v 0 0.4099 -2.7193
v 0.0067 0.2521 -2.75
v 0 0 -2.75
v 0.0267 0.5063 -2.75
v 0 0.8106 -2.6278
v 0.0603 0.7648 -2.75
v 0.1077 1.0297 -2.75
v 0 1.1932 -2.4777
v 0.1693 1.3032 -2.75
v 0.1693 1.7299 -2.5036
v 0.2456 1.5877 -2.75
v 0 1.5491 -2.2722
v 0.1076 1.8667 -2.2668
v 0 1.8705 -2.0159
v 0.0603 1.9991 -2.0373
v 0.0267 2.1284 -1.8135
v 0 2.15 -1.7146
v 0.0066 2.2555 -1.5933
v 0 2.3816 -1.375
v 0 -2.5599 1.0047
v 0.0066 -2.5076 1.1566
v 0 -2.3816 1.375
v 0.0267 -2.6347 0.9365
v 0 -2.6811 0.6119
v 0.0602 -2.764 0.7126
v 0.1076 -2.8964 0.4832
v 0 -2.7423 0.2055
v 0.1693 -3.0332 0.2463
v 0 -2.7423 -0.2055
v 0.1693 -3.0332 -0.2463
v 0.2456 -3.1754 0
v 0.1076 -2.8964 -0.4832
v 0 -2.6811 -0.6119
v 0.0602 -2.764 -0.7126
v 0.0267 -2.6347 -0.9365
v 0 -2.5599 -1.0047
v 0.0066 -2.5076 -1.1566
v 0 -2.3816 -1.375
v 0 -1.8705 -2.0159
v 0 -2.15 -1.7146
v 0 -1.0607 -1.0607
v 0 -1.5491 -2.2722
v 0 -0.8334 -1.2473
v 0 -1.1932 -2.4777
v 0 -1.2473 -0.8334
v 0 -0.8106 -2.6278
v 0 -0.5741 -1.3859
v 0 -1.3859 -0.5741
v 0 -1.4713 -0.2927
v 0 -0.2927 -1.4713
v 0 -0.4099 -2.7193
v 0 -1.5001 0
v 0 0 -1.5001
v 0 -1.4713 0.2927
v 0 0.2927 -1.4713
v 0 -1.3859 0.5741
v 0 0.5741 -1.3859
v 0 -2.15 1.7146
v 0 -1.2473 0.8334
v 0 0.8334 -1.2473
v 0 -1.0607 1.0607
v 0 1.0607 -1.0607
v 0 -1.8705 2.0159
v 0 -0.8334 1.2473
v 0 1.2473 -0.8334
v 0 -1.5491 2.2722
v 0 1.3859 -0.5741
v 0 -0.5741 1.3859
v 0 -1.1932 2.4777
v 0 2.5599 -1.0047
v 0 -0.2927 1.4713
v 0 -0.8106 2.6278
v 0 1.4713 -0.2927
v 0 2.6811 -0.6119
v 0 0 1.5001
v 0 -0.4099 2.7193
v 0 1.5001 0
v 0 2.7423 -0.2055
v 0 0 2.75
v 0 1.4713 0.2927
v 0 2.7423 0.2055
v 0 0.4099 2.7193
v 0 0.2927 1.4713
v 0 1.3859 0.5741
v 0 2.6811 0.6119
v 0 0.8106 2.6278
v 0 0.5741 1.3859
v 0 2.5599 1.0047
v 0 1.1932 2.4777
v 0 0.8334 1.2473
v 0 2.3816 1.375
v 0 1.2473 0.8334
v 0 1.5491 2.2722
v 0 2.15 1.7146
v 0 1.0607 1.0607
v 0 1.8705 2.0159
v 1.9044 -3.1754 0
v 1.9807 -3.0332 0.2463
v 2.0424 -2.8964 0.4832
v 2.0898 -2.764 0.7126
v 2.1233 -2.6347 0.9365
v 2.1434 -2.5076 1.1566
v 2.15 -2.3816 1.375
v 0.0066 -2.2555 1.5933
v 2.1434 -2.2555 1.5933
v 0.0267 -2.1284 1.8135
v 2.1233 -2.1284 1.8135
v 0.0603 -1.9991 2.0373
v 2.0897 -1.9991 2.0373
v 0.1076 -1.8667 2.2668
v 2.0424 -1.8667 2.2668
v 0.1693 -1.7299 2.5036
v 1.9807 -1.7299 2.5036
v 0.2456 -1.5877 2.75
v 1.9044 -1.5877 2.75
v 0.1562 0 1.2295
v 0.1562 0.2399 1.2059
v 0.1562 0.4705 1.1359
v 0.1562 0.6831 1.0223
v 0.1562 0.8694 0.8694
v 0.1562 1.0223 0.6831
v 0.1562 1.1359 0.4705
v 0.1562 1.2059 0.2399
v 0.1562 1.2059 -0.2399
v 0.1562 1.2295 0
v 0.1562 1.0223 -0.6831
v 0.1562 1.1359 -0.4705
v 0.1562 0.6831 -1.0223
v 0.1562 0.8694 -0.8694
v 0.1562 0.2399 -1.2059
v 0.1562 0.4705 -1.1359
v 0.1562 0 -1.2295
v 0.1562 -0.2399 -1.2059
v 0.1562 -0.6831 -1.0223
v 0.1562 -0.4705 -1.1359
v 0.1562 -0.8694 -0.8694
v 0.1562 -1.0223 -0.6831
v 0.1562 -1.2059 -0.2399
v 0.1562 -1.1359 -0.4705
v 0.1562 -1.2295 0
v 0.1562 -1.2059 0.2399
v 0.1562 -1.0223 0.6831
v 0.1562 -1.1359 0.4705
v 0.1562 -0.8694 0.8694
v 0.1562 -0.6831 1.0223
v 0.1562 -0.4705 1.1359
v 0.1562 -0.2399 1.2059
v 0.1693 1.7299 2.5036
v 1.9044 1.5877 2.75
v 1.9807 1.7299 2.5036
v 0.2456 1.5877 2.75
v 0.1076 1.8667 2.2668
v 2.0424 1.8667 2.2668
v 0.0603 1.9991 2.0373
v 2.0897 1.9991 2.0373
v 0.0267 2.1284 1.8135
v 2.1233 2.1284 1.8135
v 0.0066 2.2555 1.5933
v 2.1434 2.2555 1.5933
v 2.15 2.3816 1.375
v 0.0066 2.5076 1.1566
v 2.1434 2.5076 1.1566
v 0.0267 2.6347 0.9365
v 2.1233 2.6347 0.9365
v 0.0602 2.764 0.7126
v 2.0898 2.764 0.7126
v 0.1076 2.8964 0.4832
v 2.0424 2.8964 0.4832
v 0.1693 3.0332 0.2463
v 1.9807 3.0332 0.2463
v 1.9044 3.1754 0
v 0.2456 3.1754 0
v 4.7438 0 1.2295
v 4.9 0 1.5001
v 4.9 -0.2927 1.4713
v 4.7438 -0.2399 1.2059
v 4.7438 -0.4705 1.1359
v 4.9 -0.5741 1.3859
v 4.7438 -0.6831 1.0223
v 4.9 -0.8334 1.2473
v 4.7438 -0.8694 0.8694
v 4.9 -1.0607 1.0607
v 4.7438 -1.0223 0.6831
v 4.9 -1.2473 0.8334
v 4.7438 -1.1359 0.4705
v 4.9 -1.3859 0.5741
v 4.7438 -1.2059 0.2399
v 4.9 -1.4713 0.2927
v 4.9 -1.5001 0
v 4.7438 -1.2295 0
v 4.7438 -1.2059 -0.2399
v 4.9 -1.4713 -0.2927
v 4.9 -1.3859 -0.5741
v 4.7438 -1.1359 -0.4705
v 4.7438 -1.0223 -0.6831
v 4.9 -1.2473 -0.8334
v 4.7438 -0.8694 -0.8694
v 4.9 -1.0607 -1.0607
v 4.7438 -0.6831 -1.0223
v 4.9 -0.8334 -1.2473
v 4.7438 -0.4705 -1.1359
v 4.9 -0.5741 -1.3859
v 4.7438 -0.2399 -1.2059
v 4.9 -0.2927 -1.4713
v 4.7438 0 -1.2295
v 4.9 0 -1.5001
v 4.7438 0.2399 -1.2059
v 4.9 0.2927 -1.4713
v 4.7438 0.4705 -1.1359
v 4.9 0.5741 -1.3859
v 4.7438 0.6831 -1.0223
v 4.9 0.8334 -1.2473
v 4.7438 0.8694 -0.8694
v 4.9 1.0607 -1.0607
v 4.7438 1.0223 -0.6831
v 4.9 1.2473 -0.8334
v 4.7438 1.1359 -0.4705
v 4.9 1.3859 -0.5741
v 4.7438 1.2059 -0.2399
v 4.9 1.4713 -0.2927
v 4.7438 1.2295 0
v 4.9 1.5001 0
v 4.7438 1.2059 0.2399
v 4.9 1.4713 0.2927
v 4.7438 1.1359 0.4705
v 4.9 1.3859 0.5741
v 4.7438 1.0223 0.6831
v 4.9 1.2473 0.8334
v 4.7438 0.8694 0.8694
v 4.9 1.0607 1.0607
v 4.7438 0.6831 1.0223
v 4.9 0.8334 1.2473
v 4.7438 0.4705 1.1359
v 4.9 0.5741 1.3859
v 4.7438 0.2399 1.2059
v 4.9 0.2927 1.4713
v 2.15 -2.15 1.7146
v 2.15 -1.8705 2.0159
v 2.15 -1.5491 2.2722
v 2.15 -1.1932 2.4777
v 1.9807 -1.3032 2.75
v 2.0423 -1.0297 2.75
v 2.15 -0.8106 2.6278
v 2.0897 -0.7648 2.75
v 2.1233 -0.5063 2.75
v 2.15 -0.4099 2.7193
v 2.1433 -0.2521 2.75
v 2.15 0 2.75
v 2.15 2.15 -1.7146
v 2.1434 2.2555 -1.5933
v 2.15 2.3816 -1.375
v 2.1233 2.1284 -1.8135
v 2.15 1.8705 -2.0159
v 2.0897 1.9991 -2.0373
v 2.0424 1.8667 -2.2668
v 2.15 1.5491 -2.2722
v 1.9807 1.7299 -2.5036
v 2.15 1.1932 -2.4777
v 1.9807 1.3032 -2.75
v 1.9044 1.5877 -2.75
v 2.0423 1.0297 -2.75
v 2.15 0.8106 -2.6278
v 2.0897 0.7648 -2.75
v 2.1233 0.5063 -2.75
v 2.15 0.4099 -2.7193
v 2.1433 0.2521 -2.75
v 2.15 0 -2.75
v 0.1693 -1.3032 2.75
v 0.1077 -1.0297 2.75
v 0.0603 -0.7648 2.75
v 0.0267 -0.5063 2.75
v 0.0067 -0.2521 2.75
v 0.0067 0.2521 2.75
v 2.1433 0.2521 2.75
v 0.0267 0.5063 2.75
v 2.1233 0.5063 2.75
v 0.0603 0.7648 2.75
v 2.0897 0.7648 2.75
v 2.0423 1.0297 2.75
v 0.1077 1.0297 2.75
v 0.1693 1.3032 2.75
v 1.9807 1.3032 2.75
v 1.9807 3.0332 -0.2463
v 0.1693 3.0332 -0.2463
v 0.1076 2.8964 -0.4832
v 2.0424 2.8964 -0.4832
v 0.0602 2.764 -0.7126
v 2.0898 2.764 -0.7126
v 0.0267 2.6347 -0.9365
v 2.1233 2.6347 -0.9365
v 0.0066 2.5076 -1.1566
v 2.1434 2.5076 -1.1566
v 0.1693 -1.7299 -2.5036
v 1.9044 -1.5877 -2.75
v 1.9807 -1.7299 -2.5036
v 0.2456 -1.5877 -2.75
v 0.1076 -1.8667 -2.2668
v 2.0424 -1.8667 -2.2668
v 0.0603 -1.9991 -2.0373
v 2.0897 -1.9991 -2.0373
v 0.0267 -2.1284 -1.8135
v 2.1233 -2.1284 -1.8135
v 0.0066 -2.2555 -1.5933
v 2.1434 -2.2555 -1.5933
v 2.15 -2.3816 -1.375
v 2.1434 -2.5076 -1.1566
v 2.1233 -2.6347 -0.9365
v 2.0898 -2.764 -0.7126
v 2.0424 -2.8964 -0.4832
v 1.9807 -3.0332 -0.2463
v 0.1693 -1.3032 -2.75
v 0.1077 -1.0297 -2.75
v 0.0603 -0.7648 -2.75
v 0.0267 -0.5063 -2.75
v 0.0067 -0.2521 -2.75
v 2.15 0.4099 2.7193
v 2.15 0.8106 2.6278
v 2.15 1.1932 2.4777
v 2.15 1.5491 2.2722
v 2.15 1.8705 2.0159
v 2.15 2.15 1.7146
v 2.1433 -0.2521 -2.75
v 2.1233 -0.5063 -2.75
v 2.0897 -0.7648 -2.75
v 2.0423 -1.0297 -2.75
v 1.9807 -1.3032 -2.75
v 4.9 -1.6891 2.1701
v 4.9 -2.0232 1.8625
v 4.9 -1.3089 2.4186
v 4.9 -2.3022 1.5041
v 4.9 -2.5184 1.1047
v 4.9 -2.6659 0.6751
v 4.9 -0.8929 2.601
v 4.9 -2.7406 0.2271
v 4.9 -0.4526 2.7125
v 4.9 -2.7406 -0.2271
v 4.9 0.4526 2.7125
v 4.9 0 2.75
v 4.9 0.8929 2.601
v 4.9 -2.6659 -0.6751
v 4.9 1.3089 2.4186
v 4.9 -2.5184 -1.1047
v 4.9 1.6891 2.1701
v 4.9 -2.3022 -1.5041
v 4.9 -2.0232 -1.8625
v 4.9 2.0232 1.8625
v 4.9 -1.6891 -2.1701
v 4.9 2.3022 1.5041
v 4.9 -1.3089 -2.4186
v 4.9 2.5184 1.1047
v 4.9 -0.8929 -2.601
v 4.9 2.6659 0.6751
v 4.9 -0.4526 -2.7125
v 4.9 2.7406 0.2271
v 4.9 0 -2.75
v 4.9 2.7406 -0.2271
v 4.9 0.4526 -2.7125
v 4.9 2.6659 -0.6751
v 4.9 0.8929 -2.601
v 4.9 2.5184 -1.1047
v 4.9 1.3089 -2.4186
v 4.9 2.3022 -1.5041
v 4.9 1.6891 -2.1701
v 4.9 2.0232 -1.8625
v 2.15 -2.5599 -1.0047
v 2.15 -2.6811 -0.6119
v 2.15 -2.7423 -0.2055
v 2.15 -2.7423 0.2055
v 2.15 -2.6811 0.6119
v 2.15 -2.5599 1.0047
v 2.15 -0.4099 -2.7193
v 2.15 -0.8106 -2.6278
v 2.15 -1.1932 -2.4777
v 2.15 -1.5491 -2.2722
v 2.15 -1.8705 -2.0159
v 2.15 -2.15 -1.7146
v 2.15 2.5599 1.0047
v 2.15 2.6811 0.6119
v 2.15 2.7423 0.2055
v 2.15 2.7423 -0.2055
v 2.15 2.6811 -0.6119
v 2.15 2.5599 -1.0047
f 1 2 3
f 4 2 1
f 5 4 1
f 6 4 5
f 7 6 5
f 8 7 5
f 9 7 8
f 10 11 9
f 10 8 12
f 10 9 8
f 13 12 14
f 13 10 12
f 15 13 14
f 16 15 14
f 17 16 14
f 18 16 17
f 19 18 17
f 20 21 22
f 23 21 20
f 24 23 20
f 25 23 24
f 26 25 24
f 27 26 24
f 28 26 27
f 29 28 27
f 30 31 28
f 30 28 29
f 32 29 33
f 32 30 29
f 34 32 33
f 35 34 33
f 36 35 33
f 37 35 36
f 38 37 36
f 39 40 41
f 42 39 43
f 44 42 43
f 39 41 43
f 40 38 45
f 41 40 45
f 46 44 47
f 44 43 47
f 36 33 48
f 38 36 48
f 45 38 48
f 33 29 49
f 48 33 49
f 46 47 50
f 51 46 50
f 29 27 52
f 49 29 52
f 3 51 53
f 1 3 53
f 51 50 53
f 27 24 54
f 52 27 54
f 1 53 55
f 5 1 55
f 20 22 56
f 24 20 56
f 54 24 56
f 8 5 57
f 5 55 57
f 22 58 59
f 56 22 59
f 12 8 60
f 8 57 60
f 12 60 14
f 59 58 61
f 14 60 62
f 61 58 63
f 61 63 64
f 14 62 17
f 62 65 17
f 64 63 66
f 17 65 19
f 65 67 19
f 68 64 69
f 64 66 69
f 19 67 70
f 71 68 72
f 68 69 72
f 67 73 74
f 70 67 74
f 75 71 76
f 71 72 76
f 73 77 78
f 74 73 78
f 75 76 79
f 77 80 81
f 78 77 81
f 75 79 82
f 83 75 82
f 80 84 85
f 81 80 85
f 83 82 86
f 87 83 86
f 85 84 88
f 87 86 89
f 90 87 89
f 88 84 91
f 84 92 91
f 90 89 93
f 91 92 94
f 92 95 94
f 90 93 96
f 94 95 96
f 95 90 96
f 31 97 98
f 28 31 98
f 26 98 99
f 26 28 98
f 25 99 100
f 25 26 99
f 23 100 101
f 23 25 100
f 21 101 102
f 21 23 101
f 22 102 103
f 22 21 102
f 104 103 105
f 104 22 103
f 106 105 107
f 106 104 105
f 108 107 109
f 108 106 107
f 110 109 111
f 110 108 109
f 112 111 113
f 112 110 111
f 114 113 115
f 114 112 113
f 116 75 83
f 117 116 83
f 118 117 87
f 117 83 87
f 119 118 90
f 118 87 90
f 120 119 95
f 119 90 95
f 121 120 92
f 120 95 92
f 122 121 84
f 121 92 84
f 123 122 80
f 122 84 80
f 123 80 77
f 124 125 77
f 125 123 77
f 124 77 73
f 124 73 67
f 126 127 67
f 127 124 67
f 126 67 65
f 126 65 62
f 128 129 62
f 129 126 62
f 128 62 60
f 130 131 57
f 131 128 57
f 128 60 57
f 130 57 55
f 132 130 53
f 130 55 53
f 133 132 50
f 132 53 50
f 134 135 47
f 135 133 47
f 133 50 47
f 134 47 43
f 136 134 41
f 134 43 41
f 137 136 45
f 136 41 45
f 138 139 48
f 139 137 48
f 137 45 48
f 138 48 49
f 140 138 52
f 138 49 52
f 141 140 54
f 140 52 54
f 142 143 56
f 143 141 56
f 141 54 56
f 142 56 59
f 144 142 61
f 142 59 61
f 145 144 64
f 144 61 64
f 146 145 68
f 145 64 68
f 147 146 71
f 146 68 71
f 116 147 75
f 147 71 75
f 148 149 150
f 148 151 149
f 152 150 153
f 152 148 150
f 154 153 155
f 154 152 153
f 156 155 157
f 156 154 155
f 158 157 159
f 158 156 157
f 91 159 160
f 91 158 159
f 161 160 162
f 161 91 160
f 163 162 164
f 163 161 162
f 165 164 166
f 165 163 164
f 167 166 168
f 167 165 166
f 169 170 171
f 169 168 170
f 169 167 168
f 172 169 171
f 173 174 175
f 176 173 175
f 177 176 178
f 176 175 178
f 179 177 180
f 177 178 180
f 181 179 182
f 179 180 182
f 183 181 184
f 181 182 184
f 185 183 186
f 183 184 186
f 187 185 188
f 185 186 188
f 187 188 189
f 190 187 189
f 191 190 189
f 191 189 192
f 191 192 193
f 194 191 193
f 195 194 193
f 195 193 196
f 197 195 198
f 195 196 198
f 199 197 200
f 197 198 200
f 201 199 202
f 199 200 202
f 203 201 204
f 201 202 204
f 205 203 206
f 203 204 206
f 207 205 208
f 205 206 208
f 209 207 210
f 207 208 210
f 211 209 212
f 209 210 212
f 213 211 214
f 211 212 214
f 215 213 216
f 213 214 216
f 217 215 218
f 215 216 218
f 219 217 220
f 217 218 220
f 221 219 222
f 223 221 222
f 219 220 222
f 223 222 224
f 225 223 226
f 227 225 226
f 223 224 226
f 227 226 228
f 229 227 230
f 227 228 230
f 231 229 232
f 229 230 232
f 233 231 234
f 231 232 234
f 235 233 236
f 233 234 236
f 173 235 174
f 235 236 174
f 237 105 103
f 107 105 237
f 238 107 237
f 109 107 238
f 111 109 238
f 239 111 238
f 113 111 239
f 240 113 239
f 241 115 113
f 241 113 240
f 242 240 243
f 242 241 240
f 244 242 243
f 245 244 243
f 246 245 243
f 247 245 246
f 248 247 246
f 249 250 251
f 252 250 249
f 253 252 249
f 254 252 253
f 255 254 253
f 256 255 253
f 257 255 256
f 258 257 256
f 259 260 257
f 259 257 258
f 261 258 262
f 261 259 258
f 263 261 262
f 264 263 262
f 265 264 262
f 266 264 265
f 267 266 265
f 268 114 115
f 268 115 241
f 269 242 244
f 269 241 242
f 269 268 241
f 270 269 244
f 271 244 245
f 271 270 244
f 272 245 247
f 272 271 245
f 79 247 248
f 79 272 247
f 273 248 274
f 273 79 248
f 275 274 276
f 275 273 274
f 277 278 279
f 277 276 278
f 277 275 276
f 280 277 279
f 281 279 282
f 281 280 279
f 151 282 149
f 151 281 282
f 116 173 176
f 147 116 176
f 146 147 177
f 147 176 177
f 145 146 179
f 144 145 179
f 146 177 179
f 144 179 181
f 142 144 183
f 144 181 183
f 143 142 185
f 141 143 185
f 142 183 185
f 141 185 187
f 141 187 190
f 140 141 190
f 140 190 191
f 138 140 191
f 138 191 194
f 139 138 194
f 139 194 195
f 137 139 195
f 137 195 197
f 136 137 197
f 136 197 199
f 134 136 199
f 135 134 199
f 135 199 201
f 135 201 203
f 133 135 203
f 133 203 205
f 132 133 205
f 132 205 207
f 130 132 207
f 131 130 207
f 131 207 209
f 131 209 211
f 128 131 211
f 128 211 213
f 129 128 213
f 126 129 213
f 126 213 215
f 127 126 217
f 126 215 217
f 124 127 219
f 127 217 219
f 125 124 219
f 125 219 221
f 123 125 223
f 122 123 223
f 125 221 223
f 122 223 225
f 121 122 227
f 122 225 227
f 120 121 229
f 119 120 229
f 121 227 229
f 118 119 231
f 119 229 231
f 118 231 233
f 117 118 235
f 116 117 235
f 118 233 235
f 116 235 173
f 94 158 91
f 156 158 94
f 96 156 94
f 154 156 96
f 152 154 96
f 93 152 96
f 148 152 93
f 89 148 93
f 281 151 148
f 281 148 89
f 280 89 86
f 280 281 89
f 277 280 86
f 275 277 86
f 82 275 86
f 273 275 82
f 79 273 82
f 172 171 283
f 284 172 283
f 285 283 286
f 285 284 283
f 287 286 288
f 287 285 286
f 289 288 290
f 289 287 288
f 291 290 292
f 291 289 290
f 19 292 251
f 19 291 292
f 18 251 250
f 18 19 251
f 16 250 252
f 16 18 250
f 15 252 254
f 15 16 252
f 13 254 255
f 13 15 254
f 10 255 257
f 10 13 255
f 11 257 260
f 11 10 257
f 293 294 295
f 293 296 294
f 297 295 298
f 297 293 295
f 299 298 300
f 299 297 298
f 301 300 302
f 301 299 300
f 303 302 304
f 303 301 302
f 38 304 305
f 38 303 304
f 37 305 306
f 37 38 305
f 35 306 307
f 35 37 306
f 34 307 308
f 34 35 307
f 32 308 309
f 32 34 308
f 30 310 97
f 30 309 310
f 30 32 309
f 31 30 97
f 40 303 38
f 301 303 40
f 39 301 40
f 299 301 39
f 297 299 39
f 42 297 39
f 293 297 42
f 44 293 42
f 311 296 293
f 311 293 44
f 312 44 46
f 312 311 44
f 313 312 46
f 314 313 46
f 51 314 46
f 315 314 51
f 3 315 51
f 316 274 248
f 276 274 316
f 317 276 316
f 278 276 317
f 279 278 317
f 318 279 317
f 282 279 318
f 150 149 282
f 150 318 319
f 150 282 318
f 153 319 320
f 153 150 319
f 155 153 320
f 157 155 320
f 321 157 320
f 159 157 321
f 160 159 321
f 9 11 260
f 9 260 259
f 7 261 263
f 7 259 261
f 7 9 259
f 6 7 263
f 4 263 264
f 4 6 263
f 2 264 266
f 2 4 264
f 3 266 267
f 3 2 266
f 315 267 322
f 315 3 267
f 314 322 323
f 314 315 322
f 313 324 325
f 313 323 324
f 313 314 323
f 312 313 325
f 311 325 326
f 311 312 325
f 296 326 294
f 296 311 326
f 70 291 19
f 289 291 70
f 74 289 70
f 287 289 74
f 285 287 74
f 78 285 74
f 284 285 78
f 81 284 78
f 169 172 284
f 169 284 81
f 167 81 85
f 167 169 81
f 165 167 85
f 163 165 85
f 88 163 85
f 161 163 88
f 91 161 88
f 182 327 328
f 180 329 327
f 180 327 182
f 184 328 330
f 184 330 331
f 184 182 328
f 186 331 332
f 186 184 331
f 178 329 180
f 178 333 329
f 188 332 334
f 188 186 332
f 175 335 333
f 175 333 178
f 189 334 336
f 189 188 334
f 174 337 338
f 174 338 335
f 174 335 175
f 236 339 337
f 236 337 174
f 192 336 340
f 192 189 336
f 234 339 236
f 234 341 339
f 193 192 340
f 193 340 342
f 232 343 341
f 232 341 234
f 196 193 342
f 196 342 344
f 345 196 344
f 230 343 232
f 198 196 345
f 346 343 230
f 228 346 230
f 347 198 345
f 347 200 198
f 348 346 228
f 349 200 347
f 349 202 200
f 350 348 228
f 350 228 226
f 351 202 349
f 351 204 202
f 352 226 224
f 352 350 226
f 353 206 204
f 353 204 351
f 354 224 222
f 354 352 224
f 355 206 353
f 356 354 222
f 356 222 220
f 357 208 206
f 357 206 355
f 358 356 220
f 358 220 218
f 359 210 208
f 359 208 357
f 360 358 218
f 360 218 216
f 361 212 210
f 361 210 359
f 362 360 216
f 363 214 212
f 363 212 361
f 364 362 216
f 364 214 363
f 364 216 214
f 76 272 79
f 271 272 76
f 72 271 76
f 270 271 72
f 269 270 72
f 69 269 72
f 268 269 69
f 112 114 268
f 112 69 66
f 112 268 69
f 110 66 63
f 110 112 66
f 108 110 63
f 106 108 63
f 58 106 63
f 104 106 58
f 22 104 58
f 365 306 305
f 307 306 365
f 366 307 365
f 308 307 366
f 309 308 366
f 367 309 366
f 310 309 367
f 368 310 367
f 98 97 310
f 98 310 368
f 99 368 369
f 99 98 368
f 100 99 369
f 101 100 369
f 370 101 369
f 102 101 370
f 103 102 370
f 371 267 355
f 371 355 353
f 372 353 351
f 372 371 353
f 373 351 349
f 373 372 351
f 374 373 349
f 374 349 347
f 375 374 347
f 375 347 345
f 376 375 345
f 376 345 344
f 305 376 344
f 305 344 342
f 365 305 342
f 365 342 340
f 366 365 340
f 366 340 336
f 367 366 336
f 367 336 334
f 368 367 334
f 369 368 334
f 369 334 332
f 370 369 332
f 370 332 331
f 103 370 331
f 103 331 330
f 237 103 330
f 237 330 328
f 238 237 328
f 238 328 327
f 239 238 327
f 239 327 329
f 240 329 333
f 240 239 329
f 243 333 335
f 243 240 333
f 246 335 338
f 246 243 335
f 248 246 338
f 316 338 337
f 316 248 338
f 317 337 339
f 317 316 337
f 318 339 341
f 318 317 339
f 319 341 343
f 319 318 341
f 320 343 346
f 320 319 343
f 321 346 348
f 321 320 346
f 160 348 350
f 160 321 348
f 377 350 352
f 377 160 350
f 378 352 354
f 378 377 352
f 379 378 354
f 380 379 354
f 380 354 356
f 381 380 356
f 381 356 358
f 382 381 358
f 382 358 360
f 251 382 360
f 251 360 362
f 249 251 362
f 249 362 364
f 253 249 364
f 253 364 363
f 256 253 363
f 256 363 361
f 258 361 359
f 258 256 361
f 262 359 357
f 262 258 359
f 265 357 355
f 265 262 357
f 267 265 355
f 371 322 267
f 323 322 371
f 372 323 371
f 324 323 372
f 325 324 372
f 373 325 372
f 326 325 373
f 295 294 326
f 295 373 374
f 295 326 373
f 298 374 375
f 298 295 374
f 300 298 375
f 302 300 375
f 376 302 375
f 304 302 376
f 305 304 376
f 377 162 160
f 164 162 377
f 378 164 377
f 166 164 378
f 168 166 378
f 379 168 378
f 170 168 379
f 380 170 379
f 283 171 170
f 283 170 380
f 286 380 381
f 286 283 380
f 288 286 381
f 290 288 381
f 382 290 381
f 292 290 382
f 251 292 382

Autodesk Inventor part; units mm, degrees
ref_plane "YZ Plane" through (0, 0, 0) normal (1, 0, 0) x (0, 1, 0)
ref_plane "XZ Plane" through (0, 0, 0) normal (0, 1, 0) x (-1, 0, 0)
sketch "Sketch1" plane through (0, 0, 0) normal (1, 0, 0) x (0, 1, 0)
  line L0 (1.5877, -2.75) -> (-1.5877, -2.75)
  line L1 (-1.5877, -2.75) -> (-3.1754, 0)
  line L2 (-3.1754, 0) -> (-1.5877, 2.75)
  line L3 (-1.5877, 2.75) -> (1.5877, 2.75)
  line L4 (1.5877, 2.75) -> (3.1754, 0)
  line L5 (3.1754, 0) -> (1.5877, -2.75)
  point P0 (0, 0)
  point P1 (0, 0)
  dimension "d0" = 6.3509
extrude "Body" add sketch "Sketch1" along normal blind 2.15
sketch "Sketch2" plane through (2.15, 0, 0) normal (1, 0, 0) x (0, 0, -1)
  circle A0 centre (0, 0) radius 2.75
  dimension "d7" = 5.5
extrude "Ring" add sketch "Sketch2" along normal blind 2.75
sketch "Sketch3" plane through (0, 0, 0) normal (0, 0, 1) x (1, 0, 0)
  line L0 (0, 1.5877) -> (0, 3.1754) projected
  line L1 (0, 3.1754) -> (2.15, 3.1754) projected
  line L2 (2.15, 1.5877) -> (2.15, 3.1754) projected
  line L3 (-0.43, 0) -> (2.58, 0) projected
  line L4 (0, 2.75) -> (0.2456, 3.1754)
  line L5 (1.9044, 3.1754) -> (2.15, 2.75)
  dimension "d3" = 30
  dimension "d4" = 30
  dimension "d5" = 5.5
  dimension "d6" = 5.5
revolve "Chamfer1" cut sketch "Sketch3" angle 360 about axis through (-10, 0, 0) along (1, 0, 0)
sketch "Sketch4" plane through (0, 0, 0) normal (-1, 0, 0) x (0, 0, 1)
  line L0 (0, -4.4456) -> (0, 4.4456) projected
  line L1 (-3.85, 0) -> (3.85, 0) projected
  point P0 (0, 0)
hole "Thread" at (0, 0, 0) direction (1, 0, 0) diameter 2.459 end through all thread size "M3x0.5" class "6H" standard "ISO Metric profile"
chamfer "Chamfer2" distance 0.2706 angle 30 1 edges at (0, 0, -1.2295) measured on face at (0, -2.2301, 0.0494)
chamfer "Chamfer3" distance 0.2706 angle 30 1 edges at (4.9, 0, -1.2295) measured on face at (4.9, -0.3175, -2.2046)
ref_plane "Work Plane1" through (9.7259, 0, 0) normal (0, 0, 1) x (-1, 0, 0)
equation "\"d0\" = 1.1547 * SW"
equation "\"d1\" = KOH1"
equation "\"d7\" = SD2"
equation "\"d8\" = KOH - KOH1"
equation "\"d3\" = ANG1"
equation "\"d4\" = ANG2"
equation "\"d5\" = SW0"
equation "\"d6\" = SW01"
equation "\"d10\" = -0.5 * GD1 + 0.5 * NND"
equation "\"d46\" = -0.5 * GD1 + 0.5 * NND"
equation "\"d12\" = -0.5 * GD1 + 0.5 * NND"
equation "\"d47\" = -0.5 * GD1 + 0.5 * NND"
equation "\"ANG1\" = 30deg"
equation "\"ANG2\" = ANG1"
equation "\"NND\" = 3"
equation "\"KOH1\" = 2.15"
equation "\"KOH\" = 4.9"
equation "\"SW\" = 5.5"
equation "\"SW0\" = SW"
equation "\"SW01\" = SW"
equation "\"SD2\" = SW"
equation "\"GUL\" = 0.541266 * PTC"
equation "\"THREADDIA\" = 3"
equation "\"TOA\" = 30deg"
equation "\"PTC\" = 0.5"
equation "\"E0\" = 1.155 * SW"
equation "\"GAL\" = 0.541266 * PTC"
equation "\"GD1\" = 2.458734"
properties part number "NF E 25-409 - M3" material "Steel, Mild"
